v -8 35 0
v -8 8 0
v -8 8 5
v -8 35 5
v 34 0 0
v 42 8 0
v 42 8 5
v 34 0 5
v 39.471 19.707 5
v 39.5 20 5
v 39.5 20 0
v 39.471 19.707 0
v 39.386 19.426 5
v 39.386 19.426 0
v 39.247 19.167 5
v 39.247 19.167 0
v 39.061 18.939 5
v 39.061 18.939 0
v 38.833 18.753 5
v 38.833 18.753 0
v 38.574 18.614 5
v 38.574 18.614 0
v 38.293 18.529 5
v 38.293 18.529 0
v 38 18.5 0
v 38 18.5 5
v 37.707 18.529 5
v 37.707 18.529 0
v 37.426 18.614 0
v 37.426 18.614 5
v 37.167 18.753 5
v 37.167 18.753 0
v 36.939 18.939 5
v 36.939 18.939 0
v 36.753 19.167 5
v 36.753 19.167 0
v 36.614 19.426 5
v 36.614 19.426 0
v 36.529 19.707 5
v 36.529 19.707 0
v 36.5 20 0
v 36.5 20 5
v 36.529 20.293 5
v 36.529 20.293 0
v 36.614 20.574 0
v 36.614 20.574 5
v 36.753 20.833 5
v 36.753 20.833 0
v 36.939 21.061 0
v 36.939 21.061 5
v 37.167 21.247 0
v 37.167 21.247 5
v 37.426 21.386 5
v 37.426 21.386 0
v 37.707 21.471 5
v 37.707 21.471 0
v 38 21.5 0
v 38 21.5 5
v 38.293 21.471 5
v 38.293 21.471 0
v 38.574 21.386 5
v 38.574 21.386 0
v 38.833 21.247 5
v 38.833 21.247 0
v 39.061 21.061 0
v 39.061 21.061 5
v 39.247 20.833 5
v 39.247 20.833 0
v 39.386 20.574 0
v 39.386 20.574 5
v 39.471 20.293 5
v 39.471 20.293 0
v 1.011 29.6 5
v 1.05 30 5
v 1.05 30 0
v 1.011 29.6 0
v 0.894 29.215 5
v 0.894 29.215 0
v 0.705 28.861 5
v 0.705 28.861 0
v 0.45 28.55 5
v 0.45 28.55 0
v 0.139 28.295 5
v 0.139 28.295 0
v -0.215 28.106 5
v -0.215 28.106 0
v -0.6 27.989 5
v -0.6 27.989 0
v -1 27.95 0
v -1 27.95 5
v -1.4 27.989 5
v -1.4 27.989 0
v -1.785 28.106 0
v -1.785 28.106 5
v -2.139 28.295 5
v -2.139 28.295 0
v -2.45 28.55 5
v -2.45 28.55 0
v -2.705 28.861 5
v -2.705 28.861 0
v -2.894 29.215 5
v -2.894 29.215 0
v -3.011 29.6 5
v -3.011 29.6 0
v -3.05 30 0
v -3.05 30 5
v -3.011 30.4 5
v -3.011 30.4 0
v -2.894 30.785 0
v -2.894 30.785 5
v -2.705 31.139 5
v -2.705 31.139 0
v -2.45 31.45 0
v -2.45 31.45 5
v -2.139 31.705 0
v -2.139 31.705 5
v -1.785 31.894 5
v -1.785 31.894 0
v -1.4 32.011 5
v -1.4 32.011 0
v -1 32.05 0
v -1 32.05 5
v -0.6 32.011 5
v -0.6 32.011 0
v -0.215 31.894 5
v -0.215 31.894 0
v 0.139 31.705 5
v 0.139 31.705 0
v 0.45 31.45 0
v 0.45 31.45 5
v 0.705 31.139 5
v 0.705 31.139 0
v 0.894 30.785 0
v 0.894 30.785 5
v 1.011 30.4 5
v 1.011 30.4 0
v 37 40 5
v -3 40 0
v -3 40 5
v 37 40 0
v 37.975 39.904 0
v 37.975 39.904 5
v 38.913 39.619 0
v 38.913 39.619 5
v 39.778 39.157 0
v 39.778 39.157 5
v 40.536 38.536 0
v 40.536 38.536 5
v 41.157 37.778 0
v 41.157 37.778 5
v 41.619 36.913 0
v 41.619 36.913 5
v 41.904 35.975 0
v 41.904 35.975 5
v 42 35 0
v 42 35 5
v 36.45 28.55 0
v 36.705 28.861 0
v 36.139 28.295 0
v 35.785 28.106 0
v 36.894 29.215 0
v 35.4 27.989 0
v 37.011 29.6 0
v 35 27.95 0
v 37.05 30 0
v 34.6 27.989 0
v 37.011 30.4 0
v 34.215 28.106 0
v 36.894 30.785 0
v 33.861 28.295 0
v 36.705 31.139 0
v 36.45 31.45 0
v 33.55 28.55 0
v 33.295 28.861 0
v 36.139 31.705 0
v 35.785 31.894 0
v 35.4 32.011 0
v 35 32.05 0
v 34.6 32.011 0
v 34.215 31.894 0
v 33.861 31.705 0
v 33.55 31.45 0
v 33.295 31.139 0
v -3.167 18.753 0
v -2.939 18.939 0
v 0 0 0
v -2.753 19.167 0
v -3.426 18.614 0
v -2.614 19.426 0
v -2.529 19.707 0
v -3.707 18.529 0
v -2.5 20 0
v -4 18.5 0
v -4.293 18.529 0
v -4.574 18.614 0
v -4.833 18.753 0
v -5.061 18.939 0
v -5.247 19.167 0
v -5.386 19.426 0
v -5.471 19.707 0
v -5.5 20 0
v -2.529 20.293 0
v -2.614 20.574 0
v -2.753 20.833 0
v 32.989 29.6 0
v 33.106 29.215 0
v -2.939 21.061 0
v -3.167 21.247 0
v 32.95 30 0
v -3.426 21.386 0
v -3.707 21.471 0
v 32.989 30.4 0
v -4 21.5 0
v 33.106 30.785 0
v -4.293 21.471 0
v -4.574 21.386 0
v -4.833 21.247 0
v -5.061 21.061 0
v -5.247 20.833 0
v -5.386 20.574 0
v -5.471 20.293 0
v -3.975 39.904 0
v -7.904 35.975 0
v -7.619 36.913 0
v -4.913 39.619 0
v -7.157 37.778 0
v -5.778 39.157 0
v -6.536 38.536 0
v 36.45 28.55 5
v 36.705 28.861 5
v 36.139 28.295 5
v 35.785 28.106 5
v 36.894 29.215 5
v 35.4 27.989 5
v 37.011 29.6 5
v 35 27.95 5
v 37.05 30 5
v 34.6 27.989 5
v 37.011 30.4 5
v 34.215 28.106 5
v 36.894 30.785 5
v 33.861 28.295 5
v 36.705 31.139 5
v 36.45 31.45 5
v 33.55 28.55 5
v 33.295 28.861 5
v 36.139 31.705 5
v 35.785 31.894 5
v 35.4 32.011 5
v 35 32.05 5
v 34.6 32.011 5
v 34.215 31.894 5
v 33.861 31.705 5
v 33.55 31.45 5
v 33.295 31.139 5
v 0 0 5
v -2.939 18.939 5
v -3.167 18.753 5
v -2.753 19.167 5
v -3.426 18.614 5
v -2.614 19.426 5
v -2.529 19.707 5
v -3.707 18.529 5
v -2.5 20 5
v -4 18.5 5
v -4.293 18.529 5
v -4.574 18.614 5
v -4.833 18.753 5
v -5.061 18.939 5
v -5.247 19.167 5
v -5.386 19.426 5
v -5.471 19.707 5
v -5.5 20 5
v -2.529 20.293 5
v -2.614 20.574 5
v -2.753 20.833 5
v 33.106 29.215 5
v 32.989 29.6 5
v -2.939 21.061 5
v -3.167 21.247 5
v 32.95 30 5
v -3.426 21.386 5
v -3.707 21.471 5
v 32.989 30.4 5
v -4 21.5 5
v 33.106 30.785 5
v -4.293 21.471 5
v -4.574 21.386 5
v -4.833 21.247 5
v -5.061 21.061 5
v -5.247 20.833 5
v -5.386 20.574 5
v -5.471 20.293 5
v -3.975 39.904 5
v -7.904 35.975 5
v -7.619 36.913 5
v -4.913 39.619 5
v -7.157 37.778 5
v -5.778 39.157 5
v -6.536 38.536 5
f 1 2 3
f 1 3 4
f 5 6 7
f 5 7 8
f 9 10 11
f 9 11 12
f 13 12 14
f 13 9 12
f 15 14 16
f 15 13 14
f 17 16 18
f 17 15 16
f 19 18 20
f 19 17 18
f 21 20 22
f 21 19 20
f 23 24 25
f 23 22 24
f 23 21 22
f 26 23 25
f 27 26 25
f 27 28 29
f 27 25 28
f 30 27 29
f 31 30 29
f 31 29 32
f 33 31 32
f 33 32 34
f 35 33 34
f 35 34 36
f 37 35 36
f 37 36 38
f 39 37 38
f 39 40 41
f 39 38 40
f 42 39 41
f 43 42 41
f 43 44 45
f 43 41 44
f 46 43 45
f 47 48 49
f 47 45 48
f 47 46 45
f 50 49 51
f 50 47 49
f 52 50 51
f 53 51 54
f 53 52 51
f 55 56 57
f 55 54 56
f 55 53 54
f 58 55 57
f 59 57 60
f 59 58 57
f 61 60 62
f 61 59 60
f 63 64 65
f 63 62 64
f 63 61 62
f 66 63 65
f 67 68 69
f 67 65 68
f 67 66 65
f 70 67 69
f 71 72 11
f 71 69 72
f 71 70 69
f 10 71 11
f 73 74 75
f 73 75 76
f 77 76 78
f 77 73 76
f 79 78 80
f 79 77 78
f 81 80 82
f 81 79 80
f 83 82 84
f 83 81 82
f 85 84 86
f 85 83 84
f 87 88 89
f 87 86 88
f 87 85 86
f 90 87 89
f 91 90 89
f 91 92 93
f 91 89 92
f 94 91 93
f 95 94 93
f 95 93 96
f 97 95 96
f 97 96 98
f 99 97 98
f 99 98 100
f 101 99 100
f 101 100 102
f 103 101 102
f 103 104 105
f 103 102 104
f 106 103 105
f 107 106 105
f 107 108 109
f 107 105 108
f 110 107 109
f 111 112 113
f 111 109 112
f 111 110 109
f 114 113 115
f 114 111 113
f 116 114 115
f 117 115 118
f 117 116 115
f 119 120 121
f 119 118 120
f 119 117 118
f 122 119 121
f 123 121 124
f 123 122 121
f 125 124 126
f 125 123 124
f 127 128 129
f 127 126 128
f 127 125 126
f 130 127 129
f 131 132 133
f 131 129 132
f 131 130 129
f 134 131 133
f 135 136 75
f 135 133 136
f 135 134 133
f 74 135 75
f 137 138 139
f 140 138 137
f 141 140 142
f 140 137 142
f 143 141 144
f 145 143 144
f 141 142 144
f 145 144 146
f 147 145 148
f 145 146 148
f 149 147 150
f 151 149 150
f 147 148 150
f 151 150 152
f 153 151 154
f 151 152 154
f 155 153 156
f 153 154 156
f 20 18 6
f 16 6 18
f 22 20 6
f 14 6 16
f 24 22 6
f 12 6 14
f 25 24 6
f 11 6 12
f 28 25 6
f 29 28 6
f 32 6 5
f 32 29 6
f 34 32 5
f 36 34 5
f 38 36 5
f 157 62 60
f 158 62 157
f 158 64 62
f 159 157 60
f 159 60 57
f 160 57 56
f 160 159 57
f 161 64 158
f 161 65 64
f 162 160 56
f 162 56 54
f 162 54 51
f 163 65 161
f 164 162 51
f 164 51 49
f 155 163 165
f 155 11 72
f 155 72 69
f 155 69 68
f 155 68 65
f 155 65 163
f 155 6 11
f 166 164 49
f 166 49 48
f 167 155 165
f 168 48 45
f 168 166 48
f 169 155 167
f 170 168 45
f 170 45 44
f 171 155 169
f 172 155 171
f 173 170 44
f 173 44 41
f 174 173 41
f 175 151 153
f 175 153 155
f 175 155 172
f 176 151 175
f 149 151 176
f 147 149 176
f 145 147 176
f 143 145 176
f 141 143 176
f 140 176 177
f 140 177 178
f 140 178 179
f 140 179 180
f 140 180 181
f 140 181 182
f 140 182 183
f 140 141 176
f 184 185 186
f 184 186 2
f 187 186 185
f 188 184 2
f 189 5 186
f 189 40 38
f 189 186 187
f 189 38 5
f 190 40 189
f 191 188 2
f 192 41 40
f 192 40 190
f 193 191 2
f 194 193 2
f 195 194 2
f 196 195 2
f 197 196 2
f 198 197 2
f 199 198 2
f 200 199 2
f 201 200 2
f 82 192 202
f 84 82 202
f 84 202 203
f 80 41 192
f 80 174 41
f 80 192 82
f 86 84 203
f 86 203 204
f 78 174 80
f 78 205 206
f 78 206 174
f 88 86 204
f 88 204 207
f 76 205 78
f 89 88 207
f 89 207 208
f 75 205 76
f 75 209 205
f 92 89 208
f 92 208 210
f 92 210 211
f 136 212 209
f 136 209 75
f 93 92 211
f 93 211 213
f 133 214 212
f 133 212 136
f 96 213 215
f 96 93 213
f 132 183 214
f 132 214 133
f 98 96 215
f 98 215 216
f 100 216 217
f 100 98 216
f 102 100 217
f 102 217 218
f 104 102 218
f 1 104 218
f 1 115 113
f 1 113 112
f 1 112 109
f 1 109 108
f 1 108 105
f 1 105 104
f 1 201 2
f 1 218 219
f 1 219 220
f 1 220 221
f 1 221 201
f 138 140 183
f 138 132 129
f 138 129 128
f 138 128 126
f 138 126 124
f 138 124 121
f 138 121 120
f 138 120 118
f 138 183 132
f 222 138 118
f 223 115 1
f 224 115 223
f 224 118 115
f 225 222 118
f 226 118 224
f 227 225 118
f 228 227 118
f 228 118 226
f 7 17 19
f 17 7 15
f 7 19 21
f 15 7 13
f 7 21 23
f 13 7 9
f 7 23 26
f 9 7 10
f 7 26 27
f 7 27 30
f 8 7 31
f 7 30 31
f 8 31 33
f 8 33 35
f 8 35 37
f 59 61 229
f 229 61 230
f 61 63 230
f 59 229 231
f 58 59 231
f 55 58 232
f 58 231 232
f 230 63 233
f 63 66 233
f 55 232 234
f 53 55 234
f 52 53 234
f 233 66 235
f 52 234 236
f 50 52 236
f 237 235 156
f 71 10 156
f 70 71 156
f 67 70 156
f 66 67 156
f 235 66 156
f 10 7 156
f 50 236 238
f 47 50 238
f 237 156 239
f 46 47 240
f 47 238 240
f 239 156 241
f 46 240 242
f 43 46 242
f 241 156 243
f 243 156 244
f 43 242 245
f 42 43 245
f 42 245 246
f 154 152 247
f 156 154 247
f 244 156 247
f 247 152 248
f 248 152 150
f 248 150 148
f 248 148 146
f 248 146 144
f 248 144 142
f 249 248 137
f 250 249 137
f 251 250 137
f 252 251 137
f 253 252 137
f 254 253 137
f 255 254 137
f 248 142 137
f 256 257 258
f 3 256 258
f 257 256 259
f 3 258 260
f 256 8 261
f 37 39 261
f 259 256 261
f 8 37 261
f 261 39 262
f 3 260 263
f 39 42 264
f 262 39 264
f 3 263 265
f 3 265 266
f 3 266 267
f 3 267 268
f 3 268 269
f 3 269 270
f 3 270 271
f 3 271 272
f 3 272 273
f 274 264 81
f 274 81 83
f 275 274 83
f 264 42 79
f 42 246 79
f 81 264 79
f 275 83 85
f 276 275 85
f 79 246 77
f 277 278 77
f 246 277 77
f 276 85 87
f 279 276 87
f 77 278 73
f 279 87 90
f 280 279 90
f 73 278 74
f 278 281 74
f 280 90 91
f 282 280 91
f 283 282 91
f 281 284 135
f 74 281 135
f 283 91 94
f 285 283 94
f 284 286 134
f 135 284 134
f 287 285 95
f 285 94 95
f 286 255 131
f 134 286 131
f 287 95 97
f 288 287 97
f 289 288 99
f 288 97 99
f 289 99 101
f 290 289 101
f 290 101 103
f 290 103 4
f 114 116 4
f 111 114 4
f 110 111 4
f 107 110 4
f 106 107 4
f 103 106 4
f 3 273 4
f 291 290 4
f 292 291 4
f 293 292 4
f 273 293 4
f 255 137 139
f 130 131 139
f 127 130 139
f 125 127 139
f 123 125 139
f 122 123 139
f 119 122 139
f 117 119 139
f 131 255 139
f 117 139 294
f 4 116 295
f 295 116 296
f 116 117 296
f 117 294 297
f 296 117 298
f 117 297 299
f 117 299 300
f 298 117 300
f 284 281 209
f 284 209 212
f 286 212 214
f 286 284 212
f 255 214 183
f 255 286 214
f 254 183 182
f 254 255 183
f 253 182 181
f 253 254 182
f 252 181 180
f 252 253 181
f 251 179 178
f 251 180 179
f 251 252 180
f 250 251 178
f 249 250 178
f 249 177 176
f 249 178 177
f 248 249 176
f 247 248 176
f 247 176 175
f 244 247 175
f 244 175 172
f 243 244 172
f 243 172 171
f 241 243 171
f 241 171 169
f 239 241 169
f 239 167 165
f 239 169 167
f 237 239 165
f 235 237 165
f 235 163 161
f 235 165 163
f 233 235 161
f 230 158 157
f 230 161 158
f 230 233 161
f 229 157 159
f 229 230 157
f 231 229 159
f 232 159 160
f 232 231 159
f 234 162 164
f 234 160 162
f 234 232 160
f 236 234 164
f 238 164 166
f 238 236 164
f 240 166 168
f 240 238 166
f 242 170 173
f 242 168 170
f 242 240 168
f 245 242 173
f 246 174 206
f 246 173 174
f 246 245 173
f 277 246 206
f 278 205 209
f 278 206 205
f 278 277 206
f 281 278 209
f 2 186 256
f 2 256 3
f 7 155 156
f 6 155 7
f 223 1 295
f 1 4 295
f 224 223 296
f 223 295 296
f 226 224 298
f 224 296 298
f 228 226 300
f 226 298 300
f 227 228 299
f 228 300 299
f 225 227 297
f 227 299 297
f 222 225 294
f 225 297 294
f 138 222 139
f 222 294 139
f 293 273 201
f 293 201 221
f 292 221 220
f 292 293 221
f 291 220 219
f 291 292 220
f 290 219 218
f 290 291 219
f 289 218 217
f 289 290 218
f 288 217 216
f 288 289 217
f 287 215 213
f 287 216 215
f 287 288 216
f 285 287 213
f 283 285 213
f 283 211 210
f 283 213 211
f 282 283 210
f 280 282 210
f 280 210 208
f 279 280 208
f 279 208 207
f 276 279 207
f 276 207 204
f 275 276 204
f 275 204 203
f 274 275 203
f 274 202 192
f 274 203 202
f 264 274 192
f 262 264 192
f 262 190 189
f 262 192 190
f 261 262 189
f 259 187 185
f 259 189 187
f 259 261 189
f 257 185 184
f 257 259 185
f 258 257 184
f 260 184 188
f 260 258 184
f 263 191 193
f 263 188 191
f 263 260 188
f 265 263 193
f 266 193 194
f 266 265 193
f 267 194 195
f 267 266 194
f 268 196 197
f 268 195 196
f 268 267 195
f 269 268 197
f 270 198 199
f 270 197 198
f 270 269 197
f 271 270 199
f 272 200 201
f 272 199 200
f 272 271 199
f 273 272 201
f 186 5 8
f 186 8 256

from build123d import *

# Parameters (mm, degrees)
BOSS_EXTRU_1_DEPTH           = 5
ENL_V_MAT_EXTRU_2_DEPTH      = 59.215118311
ENL_V_MAT_EXTRU_2_DEPTH_BACK = 59.215118311
ESQUISSE3_R                  = 1.5
ESQUISSE3_R_2                = 2.05
CONG_1_R                     = 5


with BuildPart() as part:
    # Esquisse1 → Boss.-Extru.1 (new body)
    with BuildSketch(Plane.XY):
        Polygon((0, 0), (-8, 8), (-8, 40), (42, 40), (42, 8), (34, 0), align=None)
    extrude(amount=BOSS_EXTRU_1_DEPTH)

    # Esquisse3 → Enlèv. mat.-Extru.2 (cut, two sides: drawn at the far end of the back side and taken through both)
    with BuildSketch(Plane(origin=(0, 0, 0), x_dir=(-1, 0, 0), z_dir=(0, 0, -1)).offset(-ENL_V_MAT_EXTRU_2_DEPTH_BACK)):
        with Locations((4, 20)):
            Circle(ESQUISSE3_R)
        with Locations(Location((-38, 20, 0), (0, 0, 180))):
            Circle(ESQUISSE3_R)
        with Locations((-35, 30)):
            Circle(ESQUISSE3_R_2)
        with Locations(Location((1, 30, 0), (0, 0, 180))):
            Circle(ESQUISSE3_R_2)
    extrude(amount=ENL_V_MAT_EXTRU_2_DEPTH + ENL_V_MAT_EXTRU_2_DEPTH_BACK, mode=Mode.SUBTRACT)

    # Congé1
    cong_1_edges = [part.edges().sort_by_distance(p)[0] for p in [
        (-8, 40, 2.5),
        (42, 40, 2.5),
    ]]
    fillet(cong_1_edges, radius=CONG_1_R)


solid = part.part
